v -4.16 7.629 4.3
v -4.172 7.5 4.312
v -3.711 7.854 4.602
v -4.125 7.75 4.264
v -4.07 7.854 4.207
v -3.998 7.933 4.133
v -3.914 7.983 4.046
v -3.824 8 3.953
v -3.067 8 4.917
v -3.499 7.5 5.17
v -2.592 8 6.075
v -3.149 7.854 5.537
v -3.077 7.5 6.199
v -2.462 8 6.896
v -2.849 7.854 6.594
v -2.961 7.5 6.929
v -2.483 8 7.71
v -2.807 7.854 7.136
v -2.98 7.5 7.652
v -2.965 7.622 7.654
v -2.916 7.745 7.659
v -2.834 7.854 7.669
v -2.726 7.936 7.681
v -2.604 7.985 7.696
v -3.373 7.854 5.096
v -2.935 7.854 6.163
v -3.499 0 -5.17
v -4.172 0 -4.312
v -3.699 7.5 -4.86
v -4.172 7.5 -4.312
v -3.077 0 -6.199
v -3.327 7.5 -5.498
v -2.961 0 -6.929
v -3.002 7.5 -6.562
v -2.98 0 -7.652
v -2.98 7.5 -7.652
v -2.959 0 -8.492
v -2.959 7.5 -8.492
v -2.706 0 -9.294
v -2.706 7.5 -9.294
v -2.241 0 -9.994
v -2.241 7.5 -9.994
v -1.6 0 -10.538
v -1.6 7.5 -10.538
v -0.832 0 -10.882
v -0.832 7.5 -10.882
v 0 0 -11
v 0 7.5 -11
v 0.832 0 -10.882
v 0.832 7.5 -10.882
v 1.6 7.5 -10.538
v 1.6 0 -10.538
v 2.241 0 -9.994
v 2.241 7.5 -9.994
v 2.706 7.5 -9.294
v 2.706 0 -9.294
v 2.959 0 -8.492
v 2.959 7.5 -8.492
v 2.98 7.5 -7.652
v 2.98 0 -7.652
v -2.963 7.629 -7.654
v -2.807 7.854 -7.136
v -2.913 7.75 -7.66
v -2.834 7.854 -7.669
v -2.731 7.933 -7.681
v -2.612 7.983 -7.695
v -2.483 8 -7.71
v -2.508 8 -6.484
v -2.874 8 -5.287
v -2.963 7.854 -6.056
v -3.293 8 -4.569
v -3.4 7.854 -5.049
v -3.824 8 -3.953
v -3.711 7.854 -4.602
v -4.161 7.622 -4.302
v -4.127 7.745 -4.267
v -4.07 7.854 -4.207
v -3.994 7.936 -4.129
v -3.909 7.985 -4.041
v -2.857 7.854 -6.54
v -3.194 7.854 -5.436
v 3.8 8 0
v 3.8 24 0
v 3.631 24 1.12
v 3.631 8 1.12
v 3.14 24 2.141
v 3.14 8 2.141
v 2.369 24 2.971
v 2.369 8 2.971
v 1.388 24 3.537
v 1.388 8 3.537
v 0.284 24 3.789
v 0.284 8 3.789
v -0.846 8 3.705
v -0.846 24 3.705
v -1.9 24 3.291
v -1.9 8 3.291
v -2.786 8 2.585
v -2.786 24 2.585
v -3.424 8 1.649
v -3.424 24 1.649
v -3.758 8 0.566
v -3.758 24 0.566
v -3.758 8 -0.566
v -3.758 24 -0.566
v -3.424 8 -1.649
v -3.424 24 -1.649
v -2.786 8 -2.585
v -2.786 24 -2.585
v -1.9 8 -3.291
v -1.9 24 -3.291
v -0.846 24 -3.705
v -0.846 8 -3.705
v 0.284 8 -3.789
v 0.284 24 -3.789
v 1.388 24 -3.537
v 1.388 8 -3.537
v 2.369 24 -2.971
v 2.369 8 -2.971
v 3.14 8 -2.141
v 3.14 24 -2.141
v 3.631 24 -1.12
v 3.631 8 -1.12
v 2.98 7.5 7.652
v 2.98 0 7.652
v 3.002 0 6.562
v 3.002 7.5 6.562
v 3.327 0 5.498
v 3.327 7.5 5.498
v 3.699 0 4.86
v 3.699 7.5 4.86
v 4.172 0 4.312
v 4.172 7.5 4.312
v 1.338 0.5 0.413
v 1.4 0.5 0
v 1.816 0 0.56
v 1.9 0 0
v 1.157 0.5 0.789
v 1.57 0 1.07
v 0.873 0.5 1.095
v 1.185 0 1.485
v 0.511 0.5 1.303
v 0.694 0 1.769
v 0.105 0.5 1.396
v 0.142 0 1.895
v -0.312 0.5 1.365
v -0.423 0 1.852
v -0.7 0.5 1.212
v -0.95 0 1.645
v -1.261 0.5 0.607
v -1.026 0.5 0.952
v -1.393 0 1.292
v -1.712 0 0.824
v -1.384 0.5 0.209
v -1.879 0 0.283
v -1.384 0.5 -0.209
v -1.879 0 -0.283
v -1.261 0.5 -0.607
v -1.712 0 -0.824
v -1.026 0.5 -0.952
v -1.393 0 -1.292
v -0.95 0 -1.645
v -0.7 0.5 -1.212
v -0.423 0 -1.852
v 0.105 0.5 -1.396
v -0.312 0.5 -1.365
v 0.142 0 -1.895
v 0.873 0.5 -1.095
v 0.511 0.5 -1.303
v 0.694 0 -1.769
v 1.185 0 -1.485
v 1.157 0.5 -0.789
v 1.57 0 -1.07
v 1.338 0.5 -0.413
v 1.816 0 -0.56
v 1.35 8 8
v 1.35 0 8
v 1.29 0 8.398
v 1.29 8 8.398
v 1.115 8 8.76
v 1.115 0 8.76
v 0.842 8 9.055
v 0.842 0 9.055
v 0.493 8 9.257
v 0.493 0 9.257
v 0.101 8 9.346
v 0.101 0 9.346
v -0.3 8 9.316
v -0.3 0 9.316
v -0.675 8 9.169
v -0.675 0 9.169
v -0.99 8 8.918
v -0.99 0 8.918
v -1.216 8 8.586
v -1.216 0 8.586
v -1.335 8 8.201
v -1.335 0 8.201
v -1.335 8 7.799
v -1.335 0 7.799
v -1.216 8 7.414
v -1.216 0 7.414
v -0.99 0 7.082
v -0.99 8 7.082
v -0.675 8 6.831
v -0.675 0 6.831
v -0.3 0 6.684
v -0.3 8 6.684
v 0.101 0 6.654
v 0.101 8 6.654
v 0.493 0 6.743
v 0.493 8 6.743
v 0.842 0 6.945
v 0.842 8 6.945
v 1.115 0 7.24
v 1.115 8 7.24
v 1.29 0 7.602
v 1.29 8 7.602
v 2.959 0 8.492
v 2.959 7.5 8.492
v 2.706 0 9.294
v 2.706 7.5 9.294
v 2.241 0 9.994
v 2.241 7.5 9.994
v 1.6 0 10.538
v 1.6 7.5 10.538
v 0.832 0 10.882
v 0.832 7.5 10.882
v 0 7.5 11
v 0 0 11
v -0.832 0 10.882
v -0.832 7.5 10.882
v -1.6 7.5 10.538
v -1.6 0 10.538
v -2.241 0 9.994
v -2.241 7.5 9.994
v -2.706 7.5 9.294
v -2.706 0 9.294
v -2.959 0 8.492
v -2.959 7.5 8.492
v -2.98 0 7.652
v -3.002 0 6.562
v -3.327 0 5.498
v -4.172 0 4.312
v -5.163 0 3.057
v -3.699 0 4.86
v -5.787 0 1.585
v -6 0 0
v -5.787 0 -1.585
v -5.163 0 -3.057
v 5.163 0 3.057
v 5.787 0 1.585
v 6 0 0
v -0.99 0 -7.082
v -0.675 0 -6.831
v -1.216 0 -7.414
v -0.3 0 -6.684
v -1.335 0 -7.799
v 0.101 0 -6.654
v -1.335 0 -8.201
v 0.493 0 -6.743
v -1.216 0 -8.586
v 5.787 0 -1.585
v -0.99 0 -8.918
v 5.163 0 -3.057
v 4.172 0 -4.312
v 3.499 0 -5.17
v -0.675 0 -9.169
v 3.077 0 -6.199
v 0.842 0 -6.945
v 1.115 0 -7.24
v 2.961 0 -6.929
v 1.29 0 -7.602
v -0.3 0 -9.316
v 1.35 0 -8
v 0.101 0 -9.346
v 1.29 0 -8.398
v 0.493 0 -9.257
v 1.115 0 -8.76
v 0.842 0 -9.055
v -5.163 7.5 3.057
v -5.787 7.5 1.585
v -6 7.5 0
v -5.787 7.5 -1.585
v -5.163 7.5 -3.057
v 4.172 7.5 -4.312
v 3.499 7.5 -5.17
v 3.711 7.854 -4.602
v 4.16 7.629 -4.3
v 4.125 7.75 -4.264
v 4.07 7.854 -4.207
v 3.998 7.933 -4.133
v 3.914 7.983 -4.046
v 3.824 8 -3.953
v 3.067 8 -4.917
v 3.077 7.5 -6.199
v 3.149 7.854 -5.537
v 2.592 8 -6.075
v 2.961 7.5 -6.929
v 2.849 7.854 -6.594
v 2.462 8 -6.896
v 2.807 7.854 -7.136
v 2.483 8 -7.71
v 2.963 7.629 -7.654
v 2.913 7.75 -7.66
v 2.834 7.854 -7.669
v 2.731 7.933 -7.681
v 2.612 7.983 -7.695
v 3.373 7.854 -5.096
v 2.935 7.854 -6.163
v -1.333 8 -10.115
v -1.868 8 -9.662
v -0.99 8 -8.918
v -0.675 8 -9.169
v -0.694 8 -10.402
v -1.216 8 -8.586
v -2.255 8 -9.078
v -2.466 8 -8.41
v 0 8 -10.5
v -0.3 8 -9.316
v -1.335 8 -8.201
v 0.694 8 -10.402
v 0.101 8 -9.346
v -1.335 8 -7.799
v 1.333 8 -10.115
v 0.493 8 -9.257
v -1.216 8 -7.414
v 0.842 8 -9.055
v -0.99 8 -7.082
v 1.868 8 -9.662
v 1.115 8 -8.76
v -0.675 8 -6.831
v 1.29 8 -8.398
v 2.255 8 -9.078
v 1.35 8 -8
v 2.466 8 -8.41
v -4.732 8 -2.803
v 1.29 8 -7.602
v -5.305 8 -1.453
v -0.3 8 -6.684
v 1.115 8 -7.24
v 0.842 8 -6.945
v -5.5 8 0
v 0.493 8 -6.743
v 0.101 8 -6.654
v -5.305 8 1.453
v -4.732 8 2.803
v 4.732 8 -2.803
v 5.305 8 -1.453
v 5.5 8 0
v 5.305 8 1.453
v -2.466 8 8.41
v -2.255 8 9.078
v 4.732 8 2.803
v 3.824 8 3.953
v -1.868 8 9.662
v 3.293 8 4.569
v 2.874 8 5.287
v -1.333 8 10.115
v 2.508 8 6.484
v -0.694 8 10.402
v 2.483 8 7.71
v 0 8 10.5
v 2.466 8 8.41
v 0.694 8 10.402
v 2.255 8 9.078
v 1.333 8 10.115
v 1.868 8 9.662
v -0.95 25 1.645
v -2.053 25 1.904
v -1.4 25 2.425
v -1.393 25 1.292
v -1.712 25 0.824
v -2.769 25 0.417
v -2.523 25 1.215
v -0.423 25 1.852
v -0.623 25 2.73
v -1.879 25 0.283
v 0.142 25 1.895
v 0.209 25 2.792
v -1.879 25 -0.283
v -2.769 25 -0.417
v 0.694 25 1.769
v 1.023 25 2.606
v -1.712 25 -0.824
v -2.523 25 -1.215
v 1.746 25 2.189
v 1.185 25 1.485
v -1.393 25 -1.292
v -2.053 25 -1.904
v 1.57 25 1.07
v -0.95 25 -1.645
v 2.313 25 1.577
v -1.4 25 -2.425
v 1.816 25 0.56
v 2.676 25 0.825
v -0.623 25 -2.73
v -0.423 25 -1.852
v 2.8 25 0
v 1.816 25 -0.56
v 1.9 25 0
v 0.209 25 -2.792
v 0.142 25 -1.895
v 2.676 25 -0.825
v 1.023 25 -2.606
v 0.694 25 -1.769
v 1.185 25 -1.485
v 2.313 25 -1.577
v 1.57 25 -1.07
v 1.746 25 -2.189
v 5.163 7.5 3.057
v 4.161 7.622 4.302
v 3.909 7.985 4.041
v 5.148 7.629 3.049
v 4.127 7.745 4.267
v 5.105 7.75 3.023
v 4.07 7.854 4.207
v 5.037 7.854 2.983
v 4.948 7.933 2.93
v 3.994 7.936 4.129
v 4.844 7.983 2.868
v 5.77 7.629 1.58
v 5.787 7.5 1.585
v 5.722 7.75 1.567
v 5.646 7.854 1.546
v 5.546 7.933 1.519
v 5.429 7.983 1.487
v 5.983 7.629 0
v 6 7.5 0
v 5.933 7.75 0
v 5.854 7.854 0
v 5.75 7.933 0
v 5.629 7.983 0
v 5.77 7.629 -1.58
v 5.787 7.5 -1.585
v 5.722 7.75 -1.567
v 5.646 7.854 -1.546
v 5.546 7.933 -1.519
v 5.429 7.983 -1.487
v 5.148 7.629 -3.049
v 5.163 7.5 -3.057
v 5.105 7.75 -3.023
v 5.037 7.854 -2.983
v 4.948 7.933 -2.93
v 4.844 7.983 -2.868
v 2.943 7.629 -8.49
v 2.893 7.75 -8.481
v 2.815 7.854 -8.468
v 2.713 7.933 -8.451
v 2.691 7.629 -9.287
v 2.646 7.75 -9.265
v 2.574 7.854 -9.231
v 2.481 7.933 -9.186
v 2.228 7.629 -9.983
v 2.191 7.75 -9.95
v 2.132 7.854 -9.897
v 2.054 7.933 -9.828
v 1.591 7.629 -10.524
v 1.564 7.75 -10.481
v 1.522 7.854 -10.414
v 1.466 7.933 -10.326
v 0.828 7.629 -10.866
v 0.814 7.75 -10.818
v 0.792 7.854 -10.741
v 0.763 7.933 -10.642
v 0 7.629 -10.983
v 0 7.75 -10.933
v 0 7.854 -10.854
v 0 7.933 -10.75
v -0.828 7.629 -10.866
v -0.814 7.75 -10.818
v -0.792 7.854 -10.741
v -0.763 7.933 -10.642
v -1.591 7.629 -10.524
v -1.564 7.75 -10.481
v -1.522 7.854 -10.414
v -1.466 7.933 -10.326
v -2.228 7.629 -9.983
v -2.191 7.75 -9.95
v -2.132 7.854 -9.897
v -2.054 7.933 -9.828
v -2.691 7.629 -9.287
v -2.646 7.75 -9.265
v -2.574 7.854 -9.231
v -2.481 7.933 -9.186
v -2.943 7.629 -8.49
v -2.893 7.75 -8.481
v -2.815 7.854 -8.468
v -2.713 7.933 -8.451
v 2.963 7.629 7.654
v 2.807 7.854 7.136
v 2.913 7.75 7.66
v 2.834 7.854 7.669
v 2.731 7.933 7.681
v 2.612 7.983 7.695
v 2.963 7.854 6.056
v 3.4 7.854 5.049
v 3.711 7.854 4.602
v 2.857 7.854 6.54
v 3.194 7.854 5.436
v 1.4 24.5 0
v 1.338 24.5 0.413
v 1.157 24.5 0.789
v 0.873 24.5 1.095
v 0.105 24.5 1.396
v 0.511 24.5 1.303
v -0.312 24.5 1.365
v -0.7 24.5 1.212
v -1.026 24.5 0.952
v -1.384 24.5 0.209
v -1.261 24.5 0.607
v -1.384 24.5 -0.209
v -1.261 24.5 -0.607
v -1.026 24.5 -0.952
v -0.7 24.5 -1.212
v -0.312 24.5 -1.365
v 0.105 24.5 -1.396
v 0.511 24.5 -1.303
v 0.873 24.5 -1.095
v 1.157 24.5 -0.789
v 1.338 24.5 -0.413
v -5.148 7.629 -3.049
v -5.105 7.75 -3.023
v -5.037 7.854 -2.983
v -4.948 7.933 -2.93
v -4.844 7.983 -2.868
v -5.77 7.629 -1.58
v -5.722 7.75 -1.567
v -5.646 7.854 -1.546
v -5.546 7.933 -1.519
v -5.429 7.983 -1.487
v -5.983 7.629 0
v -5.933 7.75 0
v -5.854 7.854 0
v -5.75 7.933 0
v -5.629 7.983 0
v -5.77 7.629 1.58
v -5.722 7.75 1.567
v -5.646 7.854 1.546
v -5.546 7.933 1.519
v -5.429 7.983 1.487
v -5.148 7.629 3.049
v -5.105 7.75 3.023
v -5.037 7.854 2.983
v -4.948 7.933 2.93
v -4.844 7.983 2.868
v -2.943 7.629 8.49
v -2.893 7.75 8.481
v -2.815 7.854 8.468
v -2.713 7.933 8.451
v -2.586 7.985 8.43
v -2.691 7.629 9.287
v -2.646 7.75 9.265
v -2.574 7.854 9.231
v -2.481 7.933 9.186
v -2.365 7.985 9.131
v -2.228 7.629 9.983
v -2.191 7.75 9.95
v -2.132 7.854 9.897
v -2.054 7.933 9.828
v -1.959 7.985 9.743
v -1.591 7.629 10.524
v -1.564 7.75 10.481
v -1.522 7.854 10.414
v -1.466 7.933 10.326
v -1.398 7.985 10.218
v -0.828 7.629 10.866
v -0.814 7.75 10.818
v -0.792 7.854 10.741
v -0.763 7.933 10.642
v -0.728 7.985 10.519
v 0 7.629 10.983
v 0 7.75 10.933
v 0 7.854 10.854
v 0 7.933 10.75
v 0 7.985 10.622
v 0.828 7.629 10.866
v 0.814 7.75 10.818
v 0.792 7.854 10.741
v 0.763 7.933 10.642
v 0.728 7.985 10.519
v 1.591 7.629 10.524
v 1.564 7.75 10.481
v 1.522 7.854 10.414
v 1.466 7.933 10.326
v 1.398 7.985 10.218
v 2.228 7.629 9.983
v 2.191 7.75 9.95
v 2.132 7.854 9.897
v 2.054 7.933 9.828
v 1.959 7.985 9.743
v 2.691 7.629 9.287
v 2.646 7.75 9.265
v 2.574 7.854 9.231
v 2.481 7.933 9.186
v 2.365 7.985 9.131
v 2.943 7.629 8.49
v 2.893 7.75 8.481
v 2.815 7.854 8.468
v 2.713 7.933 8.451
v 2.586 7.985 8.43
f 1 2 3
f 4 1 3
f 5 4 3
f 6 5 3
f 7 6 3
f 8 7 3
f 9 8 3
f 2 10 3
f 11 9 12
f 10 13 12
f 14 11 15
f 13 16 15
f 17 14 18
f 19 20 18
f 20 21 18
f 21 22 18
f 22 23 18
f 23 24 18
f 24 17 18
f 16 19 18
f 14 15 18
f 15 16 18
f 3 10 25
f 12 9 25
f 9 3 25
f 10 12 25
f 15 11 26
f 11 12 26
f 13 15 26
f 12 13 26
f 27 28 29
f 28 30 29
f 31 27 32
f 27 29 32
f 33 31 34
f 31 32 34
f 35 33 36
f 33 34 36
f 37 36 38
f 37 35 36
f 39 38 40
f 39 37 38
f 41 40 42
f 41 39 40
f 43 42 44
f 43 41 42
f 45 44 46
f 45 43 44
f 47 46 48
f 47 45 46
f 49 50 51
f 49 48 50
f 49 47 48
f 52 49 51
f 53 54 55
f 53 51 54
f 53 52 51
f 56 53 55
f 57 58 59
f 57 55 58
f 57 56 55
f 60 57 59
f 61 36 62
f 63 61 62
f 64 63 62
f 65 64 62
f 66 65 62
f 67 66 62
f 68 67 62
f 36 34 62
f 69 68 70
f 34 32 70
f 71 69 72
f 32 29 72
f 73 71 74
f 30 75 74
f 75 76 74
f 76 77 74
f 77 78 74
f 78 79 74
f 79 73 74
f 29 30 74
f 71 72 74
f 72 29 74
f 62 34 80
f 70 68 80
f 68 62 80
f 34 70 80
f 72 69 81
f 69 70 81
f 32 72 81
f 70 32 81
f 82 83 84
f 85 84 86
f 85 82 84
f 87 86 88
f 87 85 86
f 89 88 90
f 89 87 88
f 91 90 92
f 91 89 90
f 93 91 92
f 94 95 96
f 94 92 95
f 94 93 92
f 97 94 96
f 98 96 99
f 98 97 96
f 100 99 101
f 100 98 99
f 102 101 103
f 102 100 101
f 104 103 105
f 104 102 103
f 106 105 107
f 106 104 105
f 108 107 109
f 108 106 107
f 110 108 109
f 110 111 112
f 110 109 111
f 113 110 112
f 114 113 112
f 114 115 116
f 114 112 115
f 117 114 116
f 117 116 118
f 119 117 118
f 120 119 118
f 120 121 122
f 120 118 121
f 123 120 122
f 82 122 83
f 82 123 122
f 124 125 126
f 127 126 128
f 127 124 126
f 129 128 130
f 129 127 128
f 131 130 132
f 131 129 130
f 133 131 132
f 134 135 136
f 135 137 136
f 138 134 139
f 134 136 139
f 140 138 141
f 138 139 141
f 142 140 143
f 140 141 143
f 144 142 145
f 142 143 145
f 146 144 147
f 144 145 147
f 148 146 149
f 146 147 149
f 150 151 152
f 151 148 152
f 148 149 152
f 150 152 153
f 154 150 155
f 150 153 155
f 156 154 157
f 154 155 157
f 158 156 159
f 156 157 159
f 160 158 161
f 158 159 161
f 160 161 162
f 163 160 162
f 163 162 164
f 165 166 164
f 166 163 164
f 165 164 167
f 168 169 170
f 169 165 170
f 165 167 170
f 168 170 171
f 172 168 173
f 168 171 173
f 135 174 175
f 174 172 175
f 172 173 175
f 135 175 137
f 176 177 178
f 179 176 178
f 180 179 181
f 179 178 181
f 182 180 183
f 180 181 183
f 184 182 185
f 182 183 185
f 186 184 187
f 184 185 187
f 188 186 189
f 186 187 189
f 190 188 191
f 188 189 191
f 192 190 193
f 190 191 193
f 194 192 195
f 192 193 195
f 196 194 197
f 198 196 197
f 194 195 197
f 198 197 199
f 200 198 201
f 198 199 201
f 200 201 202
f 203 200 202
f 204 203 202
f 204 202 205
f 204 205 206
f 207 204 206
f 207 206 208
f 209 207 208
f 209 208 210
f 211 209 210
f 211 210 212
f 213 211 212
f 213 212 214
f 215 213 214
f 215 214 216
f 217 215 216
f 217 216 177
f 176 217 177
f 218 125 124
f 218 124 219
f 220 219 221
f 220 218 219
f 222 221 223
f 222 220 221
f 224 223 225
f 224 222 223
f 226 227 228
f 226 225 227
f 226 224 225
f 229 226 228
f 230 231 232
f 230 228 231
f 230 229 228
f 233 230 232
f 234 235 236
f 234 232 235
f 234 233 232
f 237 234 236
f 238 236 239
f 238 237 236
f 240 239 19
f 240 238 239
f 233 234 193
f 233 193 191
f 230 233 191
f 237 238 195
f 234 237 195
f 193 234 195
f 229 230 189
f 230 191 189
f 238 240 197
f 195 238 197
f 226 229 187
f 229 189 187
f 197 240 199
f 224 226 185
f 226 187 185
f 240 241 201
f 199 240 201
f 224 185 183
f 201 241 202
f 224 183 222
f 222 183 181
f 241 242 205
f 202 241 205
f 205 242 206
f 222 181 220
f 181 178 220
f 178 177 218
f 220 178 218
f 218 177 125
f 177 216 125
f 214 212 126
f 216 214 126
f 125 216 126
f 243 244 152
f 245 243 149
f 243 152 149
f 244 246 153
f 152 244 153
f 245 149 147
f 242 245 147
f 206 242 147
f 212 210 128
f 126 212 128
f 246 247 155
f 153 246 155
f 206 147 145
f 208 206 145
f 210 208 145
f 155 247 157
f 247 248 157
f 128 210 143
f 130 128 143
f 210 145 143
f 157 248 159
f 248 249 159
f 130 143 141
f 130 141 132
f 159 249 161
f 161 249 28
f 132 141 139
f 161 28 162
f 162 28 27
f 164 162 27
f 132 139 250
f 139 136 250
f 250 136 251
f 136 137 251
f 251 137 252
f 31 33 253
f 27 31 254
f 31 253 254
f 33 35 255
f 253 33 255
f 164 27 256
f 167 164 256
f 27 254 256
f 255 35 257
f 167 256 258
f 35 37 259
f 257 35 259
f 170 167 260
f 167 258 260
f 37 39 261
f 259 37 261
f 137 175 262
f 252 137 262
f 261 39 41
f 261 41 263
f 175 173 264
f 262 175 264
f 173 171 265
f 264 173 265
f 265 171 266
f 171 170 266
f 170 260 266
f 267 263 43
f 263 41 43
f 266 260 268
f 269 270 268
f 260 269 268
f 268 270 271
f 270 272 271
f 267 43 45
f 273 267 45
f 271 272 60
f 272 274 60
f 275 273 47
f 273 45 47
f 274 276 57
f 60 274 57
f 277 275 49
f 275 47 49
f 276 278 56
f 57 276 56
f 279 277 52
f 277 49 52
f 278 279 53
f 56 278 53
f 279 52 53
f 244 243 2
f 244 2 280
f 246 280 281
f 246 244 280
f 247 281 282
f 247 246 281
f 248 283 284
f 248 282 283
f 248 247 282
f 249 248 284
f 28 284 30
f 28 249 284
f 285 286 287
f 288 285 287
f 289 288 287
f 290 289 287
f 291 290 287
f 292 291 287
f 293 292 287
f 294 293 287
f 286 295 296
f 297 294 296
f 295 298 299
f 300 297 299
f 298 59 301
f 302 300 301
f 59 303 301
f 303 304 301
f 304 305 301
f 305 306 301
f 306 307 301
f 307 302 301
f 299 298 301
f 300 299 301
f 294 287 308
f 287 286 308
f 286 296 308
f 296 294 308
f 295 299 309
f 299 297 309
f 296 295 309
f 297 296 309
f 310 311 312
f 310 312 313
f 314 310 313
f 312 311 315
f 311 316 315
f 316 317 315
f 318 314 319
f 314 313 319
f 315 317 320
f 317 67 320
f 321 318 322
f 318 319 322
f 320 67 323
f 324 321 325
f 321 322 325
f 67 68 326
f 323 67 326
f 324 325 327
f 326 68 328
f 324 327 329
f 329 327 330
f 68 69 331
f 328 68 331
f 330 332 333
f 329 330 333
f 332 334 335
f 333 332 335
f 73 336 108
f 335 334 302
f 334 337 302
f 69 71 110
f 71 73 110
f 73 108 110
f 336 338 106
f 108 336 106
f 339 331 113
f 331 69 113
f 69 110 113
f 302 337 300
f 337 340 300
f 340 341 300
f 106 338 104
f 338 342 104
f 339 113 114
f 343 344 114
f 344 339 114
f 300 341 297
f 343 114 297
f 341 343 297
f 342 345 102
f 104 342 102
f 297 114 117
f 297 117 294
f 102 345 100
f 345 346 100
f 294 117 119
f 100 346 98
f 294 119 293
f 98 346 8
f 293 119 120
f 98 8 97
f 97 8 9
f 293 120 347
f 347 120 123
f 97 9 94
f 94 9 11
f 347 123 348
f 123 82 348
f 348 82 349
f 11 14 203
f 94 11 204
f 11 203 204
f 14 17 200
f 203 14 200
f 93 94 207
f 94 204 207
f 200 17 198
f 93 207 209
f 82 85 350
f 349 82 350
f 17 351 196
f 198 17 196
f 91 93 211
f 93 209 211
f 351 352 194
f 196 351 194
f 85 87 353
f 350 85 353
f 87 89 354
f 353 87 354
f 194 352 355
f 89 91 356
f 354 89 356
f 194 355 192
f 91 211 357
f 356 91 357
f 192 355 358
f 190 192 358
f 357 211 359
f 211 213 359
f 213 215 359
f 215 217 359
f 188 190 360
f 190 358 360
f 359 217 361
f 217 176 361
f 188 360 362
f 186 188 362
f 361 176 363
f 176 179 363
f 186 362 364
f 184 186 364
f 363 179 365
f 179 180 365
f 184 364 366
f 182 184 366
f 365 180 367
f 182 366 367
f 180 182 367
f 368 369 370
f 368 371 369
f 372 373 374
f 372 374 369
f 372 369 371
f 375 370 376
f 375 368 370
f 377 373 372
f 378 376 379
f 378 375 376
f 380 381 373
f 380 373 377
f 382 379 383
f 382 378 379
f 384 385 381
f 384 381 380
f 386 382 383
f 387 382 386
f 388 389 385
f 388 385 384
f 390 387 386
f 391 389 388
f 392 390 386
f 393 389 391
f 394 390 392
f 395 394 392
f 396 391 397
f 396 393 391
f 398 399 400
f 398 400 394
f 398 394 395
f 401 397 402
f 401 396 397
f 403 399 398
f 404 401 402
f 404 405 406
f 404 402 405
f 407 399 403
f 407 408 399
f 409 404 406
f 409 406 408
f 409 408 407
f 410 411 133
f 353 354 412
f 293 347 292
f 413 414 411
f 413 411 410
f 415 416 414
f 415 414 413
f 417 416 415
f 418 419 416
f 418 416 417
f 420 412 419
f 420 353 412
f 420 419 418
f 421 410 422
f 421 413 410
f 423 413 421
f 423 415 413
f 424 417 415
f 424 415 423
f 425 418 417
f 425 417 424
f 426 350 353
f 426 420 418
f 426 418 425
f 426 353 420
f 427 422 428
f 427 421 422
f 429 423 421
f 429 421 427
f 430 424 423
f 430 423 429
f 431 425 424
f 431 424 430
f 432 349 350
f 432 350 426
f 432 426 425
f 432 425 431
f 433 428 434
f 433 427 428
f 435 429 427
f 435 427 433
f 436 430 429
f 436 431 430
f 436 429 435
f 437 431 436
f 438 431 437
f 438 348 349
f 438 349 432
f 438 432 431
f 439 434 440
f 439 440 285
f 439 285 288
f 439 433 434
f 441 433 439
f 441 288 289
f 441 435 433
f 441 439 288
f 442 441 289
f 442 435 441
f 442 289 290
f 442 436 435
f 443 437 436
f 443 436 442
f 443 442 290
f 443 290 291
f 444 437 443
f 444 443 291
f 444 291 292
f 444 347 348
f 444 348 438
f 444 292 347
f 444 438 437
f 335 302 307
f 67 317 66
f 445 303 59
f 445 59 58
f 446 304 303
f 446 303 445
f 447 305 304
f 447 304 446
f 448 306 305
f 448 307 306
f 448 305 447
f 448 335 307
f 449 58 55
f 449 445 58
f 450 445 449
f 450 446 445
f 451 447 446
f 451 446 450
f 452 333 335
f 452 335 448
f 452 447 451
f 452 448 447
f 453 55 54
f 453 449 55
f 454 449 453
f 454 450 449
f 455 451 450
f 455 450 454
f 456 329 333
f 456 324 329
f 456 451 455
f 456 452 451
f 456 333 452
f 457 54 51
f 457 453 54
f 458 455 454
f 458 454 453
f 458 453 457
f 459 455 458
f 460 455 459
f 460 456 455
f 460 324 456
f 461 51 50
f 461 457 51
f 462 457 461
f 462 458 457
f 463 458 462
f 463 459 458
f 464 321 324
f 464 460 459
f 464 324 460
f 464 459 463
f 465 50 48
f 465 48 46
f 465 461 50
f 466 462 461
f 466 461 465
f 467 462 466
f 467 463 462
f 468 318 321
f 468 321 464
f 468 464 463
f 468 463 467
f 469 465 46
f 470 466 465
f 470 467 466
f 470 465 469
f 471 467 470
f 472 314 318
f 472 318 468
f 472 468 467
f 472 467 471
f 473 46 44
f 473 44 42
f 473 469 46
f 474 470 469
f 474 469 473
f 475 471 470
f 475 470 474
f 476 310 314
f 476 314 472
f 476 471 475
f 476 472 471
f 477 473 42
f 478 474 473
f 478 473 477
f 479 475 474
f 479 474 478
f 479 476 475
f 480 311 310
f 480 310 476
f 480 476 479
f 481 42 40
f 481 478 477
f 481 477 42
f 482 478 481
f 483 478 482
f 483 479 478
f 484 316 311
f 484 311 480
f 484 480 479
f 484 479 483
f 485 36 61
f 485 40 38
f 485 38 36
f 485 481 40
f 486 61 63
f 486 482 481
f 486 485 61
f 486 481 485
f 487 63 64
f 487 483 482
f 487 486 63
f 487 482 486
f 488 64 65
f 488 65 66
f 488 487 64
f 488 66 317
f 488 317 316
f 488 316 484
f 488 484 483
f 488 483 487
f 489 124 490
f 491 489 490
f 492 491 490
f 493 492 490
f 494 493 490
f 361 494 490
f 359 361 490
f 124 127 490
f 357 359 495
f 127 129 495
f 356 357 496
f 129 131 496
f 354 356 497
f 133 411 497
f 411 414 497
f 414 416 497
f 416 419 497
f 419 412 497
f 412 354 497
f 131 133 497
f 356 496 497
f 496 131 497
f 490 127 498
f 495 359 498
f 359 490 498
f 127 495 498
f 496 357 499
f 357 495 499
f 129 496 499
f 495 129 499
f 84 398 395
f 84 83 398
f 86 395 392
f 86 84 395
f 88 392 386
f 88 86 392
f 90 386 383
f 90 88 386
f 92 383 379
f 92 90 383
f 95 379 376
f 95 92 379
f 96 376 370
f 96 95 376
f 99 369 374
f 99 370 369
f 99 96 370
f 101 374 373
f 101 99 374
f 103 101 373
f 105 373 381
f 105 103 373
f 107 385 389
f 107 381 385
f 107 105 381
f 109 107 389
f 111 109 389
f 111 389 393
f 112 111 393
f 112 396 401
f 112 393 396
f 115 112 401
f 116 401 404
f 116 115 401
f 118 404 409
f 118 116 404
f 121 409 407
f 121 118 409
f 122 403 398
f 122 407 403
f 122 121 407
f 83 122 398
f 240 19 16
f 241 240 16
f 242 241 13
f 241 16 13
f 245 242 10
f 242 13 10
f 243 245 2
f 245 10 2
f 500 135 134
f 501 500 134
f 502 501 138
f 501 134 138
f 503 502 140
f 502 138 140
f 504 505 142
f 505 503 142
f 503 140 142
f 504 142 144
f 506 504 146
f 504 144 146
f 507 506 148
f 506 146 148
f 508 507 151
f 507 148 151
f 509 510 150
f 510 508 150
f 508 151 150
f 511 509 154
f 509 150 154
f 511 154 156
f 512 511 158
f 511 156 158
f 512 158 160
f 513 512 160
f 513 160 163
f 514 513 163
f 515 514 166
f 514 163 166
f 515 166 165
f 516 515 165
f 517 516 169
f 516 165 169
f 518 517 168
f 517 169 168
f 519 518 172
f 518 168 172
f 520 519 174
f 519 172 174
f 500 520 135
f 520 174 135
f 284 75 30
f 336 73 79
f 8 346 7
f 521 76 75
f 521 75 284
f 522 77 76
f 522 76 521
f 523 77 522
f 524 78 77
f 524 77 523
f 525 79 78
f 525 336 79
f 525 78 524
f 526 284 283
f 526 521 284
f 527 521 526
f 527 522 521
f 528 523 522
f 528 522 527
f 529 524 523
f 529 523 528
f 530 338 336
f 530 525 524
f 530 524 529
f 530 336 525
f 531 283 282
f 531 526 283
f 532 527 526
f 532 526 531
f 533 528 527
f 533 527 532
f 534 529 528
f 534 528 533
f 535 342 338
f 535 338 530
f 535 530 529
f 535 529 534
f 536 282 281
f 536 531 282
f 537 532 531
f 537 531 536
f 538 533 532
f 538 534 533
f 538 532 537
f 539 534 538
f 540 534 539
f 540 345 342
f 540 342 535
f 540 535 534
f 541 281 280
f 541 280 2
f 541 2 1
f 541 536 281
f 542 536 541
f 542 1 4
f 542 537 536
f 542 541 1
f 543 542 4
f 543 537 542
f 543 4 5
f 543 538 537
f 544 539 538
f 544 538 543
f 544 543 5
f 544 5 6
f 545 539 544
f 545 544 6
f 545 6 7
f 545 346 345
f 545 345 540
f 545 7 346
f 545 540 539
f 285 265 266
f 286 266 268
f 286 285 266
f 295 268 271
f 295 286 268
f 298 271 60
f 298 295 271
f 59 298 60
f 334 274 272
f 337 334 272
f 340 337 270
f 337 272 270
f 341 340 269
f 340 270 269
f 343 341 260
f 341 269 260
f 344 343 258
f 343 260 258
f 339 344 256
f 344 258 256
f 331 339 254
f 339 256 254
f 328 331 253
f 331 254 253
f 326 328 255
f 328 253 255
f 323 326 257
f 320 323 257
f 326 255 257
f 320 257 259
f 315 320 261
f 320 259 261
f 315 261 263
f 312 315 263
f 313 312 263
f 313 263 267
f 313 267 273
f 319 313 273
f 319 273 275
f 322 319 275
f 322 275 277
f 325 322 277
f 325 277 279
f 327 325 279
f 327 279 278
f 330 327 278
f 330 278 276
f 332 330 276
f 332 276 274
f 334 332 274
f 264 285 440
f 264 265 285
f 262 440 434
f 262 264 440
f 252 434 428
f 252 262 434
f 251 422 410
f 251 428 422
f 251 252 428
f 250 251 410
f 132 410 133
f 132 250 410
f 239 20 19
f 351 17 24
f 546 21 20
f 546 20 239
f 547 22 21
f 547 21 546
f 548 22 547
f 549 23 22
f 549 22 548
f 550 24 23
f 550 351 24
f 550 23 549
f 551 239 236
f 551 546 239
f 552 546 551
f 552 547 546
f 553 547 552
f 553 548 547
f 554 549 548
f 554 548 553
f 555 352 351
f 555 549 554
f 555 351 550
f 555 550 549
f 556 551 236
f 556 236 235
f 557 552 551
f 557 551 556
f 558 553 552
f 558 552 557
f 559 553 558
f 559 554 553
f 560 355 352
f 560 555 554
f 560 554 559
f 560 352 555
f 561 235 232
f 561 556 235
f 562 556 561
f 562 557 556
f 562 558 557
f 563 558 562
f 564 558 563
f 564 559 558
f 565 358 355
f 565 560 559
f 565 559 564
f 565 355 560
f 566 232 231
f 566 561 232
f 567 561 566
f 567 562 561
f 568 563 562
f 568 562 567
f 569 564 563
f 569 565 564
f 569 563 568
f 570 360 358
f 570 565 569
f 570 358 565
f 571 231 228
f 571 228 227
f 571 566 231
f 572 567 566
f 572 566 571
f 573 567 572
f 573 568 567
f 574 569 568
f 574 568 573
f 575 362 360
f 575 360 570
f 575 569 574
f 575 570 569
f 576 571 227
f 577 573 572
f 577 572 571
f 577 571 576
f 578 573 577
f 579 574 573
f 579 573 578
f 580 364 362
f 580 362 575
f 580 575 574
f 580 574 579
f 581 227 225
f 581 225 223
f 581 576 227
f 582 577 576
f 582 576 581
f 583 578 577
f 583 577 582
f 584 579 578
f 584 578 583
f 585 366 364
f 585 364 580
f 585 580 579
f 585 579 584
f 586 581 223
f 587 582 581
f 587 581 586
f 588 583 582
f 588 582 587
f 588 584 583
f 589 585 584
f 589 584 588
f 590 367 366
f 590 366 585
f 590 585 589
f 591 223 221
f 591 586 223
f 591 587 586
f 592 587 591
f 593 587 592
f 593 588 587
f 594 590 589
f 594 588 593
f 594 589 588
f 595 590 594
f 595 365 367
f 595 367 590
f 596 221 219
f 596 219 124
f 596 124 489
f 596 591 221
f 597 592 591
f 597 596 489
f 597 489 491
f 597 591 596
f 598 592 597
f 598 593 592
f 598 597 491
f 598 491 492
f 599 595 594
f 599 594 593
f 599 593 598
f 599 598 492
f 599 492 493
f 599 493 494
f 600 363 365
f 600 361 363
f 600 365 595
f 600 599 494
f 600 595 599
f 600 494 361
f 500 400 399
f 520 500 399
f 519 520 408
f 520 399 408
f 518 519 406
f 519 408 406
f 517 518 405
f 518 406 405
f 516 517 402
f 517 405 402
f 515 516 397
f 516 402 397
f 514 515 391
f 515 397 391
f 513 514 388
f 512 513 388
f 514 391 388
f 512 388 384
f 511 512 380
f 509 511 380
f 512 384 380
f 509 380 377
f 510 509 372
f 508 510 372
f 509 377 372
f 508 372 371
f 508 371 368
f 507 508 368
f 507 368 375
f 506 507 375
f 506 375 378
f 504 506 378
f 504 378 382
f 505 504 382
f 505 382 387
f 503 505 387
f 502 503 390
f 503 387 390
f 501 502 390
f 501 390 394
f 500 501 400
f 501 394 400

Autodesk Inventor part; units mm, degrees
ref_plane "YZ Plane" through (0, 0, 0) normal (1, 0, 0) x (0, 1, 0)
ref_plane "XZ Plane" through (0, 0, 0) normal (0, 1, 0) x (-1, 0, 0)
ref_plane "XY Plane" through (0, 0, 0) normal (0, 0, 1) x (1, 0, 0)
sketch "Sketch1" plane through (0, 0, 0) normal (0, 0, 1) x (1, 0, 0)
  line L0 (0, 0) -> (0, 38.4841) construction
  line L1 (2.8, 25) -> (3.8, 24)
  line L2 (3.8, 24) -> (3.8, 0)
  line L3 (2.8, 25) -> (1.4, 25)
  line L4 (1.4, 25) -> (1.4, 0)
  line L5 (1.4, 0) -> (3.8, 0)
  dimension "d1" = 1.4
  dimension "d8" = 1
  dimension "d20" = 3.8
revolve "Revolution1" add sketch "Sketch1" angle 360 about axis through (0, 0, 0) along (0, 1, 0)
chamfer "Chamfer1" distance 0.5 angle 45 2 edges at (-1.4, 25, 0) (-1.4, 0, 0)
sketch "Sketch6" plane through (0, 0, 0) normal (0, -1, 0) x (1, 0, 0)
  line L0 (0, 0) -> (0, -8) construction
  circle A0 centre (0, 8) radius 3
  circle A1 centre (0, -8) radius 3
  circle A2 centre (0, 0) radius 6
  line L1 (0, 0) -> (0, 8) construction
  circle A3 centre (0, 8) radius 1.35
  circle A4 centre (0, -8) radius 1.35
  circle A5 centre (0, 0) radius 1.9 projected
  point P0 (1.9111, -5.6875)
  point P1 (1.9111, 5.6875)
  point P2 (-1.9111, 5.6875)
  point P3 (-1.9111, -5.6875)
  dimension "d24" = 6
  dimension "d26" = 8
  dimension "d27" = 12
  dimension "d28" = 2.7
extrude "Extrusion3" add sketch "Sketch6" against normal blind 8
fillet "Fillet1" radius 4 4 edges at (1.9111, 4, 5.6875) (-1.9111, 4, 5.6875) (1.9111, 4, -5.6875) (-1.9111, 4, -5.6875)
fillet "Fillet2" radius 0.5 4 edges at (0, 8, -11) (6, 8, 0) (-6, 8, 0) (0, 8, 11)
properties part number "caster-bng"
